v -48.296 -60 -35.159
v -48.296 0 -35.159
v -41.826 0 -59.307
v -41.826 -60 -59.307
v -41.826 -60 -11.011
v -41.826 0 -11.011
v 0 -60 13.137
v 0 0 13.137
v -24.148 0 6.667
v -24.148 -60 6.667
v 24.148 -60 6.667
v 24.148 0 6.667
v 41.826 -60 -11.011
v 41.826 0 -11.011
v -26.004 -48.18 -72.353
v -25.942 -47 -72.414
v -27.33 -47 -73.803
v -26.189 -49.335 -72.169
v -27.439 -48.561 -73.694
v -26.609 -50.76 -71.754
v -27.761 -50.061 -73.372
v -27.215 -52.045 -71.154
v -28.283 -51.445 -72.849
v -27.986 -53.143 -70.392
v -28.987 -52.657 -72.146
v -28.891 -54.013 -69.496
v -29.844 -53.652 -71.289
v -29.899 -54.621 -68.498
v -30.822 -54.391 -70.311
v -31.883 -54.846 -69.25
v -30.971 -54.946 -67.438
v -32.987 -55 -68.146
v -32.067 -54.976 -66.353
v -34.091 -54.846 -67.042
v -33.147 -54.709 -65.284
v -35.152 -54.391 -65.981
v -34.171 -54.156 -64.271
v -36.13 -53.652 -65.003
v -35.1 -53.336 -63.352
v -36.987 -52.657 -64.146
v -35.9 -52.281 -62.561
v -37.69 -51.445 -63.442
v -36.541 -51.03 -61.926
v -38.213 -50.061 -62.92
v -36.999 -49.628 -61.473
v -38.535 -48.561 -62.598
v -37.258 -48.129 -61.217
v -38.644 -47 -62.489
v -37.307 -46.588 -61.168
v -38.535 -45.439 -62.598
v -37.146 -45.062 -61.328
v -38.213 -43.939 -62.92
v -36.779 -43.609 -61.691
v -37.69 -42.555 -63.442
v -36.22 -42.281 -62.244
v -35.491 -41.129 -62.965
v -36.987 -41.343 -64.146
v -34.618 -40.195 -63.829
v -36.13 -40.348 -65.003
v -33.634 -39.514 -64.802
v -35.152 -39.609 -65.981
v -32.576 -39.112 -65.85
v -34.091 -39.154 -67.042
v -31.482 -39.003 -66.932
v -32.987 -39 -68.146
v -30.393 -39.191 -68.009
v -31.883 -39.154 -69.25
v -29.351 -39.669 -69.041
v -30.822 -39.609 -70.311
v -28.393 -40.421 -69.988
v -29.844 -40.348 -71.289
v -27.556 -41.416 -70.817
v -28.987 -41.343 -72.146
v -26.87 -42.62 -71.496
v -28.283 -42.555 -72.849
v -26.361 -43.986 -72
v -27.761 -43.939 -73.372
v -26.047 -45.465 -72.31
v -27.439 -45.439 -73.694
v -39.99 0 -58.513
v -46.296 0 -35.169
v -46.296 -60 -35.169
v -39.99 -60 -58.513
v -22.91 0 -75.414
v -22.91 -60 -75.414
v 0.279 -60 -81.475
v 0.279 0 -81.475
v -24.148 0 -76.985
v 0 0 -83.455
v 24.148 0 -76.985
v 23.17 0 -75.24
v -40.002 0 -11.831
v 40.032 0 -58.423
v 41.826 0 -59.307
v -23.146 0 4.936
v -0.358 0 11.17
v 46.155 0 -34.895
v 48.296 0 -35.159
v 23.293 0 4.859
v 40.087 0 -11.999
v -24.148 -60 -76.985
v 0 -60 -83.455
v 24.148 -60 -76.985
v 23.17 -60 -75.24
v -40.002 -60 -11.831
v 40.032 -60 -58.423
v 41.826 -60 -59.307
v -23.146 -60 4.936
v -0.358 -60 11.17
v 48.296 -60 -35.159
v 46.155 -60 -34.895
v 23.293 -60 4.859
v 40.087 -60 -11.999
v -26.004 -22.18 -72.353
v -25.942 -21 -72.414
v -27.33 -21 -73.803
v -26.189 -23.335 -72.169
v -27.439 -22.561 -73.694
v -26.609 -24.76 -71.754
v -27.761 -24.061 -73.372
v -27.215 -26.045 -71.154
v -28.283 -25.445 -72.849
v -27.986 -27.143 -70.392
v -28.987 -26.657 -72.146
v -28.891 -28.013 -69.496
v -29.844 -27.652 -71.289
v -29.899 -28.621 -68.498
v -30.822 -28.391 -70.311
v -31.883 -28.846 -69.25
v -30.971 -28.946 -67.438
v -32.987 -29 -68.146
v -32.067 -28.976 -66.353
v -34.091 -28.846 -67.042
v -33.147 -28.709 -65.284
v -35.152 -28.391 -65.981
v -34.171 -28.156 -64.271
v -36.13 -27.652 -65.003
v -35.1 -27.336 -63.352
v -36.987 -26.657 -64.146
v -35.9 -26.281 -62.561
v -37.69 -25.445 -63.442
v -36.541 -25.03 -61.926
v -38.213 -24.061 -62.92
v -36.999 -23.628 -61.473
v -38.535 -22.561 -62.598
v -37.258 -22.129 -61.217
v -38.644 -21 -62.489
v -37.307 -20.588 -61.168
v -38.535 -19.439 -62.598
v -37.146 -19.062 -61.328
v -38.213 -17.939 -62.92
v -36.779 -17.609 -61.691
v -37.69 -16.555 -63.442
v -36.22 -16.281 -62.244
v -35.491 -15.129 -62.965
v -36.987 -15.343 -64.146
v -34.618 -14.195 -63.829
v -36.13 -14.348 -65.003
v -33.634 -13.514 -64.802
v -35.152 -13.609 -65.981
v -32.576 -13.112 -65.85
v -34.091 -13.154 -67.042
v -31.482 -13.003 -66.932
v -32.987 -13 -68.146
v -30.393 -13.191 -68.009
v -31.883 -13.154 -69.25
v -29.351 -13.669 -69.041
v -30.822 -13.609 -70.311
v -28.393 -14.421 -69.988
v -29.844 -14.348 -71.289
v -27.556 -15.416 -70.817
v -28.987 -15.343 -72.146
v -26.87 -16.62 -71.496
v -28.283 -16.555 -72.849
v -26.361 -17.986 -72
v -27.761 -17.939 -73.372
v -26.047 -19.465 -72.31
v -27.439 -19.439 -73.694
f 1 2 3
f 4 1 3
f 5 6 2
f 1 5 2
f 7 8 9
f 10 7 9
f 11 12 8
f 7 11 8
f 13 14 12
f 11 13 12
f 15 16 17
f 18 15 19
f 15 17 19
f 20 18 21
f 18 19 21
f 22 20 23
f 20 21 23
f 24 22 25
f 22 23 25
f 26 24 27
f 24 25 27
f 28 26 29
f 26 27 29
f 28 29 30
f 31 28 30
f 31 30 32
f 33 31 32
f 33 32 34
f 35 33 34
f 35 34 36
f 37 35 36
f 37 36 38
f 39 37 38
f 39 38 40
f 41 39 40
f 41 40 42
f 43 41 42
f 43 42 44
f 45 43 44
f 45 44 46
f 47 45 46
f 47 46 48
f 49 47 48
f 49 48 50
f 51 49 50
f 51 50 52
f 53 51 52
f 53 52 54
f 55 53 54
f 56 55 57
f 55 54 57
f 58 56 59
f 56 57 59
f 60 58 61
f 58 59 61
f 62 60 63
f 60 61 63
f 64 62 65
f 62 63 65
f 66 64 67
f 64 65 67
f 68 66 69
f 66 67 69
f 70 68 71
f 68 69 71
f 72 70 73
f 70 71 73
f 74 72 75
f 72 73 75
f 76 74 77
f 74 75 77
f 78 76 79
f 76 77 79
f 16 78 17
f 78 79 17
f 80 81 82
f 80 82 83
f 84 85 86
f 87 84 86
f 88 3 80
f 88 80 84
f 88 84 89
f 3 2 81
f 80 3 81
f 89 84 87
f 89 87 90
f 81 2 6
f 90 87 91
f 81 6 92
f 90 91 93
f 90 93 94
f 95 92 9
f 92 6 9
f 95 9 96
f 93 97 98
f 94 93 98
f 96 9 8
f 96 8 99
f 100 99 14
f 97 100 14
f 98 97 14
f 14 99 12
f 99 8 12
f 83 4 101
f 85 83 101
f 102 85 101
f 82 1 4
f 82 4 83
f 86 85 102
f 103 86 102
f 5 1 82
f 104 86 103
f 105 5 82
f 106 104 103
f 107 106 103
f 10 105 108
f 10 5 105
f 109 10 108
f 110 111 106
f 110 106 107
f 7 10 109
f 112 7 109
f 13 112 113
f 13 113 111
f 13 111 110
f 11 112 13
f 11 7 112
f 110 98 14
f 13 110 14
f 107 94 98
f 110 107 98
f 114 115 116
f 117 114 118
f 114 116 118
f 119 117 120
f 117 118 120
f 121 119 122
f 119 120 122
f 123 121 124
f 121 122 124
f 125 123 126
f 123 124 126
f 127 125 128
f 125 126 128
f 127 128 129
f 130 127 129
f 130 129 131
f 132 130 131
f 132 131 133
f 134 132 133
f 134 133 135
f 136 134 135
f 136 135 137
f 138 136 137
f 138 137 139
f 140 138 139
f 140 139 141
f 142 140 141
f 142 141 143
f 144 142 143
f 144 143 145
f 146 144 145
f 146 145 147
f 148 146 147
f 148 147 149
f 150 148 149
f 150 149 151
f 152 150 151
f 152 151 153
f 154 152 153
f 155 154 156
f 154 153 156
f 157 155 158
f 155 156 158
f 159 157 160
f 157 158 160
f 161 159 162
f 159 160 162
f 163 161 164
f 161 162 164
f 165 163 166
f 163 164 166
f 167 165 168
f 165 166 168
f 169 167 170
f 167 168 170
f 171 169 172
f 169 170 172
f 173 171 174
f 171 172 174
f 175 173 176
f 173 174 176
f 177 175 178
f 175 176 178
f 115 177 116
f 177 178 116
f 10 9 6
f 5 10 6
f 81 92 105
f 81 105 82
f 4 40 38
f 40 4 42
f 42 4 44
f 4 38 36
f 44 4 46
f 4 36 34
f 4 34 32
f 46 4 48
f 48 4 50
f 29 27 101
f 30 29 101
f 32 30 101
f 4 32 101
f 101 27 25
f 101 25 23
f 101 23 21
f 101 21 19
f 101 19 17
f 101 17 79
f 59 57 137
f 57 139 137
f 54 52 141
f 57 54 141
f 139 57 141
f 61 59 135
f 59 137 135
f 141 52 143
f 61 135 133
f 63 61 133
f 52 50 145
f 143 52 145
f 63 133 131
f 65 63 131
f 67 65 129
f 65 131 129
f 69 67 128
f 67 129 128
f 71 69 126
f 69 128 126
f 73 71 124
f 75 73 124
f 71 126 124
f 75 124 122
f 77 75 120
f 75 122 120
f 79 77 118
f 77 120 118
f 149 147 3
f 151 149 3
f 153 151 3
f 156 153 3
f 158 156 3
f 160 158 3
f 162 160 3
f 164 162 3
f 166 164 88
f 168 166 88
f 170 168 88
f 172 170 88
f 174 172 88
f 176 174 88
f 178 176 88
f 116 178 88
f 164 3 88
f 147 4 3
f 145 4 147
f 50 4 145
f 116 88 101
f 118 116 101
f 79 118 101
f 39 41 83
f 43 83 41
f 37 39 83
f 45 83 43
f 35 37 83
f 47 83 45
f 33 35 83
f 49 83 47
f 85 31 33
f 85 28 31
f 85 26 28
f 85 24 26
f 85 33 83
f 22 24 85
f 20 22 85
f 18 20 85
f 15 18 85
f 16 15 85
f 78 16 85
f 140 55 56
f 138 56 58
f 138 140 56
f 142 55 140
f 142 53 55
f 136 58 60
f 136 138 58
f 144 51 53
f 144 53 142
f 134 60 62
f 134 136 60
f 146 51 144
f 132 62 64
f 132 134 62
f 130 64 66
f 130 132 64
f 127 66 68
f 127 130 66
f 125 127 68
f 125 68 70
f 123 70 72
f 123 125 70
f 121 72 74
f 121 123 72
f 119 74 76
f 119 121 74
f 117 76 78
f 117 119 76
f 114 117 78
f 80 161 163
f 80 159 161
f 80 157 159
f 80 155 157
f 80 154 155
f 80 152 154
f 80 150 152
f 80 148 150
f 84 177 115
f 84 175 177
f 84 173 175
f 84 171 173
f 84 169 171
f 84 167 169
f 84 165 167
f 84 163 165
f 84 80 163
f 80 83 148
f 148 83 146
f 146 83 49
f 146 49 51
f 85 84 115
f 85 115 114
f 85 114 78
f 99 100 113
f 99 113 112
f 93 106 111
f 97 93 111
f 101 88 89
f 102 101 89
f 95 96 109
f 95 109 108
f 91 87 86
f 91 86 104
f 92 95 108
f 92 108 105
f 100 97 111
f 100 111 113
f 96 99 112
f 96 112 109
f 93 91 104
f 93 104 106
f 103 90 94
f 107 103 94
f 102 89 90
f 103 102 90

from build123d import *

# Parameters (mm, degrees)
PAD_DEPTH       = 60
POCKET_DEPTH    = 60
SKETCH002_R     = 8
POCKET001_DEPTH = 5


with BuildPart() as part:
    # Sketch → Pad (new body)
    with BuildSketch(Plane.XZ):
        Polygon((0, 13.137292), (-24.148146, 6.666816), (-41.825815, -11.010853), (-48.296291, -35.158999), (-41.825815, -59.307145), (-24.148146, -76.984814), (0, -83.45529), (24.148146, -76.984814), (41.825815, -59.307145), (48.296291, -35.158999), (41.825815, -11.010853), (24.148146, 6.666816), align=None)
    extrude(amount=PAD_DEPTH)

    # Sketch001 (on Face13 of Pad) → Pocket (cut)
    with BuildSketch(Plane(origin=(0, 0, 0), x_dir=(1, 0, 0), z_dir=(0, 1, 0))):
        Polygon((0.278927, 81.474836), (23.169698, 75.240498), (40.032056, 58.422596), (46.155051, 34.895188), (40.08724, 11.999467), (23.293364, -4.858682), (-0.357735, -11.169546), (-23.145897, -4.936066), (-40.001684, 11.830942), (-46.296318, 35.16935), (-39.990105, 58.513313), (-22.910018, 75.414133), align=None)
    extrude(amount=-POCKET_DEPTH, mode=Mode.SUBTRACT)

    # Sketch002 (on Face11 of Pocket) → Pocket001 (cut)
    with BuildSketch(Plane(origin=(-50.56648, 0, -50.56648), x_dir=(0.707107, 0, -0.707107), z_dir=(-0.707107, 0, -0.707107))):
        with Locations((24.861167, 47)):
            Circle(SKETCH002_R)
        with Locations((24.861167, 21)):
            Circle(SKETCH002_R)
    extrude(amount=-POCKET001_DEPTH, mode=Mode.SUBTRACT)


solid = part.part
